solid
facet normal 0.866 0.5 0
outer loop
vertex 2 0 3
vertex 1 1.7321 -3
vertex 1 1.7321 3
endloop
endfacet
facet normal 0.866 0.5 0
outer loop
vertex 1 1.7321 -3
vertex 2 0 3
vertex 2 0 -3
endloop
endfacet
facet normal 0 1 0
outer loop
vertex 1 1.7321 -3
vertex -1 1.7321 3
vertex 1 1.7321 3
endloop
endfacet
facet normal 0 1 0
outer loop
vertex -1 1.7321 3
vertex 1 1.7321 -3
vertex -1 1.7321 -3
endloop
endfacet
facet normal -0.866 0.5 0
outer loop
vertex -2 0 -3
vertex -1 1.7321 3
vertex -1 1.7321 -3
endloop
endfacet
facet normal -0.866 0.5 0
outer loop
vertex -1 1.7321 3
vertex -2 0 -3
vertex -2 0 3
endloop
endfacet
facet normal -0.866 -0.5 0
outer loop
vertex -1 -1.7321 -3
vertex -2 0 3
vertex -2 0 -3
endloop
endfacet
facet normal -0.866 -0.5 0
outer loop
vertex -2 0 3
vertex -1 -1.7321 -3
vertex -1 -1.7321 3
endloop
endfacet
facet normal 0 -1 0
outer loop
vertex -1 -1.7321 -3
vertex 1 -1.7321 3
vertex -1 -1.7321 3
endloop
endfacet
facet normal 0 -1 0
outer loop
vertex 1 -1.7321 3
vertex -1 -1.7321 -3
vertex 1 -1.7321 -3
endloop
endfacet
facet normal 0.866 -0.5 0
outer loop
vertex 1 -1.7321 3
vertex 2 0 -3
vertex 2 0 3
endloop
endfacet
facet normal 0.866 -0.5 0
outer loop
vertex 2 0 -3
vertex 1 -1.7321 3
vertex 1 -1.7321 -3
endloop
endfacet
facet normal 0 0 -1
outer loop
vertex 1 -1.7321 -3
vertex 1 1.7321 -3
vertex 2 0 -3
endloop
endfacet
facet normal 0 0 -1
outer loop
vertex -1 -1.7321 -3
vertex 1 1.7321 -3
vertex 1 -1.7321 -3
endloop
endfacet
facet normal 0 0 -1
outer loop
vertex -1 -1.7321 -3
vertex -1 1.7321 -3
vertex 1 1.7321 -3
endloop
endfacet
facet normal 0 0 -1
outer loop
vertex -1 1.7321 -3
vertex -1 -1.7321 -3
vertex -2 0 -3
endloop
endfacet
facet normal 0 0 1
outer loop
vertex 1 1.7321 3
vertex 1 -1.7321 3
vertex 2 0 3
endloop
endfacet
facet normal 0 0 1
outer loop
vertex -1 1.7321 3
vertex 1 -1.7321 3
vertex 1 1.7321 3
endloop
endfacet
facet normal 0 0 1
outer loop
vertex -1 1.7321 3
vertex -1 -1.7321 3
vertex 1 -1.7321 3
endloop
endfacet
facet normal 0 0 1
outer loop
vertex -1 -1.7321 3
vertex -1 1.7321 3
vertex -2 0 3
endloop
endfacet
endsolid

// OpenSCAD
// hexagonal prism, centered
cylinder(h = 6, r = 2, center = true, $fn = 6);
